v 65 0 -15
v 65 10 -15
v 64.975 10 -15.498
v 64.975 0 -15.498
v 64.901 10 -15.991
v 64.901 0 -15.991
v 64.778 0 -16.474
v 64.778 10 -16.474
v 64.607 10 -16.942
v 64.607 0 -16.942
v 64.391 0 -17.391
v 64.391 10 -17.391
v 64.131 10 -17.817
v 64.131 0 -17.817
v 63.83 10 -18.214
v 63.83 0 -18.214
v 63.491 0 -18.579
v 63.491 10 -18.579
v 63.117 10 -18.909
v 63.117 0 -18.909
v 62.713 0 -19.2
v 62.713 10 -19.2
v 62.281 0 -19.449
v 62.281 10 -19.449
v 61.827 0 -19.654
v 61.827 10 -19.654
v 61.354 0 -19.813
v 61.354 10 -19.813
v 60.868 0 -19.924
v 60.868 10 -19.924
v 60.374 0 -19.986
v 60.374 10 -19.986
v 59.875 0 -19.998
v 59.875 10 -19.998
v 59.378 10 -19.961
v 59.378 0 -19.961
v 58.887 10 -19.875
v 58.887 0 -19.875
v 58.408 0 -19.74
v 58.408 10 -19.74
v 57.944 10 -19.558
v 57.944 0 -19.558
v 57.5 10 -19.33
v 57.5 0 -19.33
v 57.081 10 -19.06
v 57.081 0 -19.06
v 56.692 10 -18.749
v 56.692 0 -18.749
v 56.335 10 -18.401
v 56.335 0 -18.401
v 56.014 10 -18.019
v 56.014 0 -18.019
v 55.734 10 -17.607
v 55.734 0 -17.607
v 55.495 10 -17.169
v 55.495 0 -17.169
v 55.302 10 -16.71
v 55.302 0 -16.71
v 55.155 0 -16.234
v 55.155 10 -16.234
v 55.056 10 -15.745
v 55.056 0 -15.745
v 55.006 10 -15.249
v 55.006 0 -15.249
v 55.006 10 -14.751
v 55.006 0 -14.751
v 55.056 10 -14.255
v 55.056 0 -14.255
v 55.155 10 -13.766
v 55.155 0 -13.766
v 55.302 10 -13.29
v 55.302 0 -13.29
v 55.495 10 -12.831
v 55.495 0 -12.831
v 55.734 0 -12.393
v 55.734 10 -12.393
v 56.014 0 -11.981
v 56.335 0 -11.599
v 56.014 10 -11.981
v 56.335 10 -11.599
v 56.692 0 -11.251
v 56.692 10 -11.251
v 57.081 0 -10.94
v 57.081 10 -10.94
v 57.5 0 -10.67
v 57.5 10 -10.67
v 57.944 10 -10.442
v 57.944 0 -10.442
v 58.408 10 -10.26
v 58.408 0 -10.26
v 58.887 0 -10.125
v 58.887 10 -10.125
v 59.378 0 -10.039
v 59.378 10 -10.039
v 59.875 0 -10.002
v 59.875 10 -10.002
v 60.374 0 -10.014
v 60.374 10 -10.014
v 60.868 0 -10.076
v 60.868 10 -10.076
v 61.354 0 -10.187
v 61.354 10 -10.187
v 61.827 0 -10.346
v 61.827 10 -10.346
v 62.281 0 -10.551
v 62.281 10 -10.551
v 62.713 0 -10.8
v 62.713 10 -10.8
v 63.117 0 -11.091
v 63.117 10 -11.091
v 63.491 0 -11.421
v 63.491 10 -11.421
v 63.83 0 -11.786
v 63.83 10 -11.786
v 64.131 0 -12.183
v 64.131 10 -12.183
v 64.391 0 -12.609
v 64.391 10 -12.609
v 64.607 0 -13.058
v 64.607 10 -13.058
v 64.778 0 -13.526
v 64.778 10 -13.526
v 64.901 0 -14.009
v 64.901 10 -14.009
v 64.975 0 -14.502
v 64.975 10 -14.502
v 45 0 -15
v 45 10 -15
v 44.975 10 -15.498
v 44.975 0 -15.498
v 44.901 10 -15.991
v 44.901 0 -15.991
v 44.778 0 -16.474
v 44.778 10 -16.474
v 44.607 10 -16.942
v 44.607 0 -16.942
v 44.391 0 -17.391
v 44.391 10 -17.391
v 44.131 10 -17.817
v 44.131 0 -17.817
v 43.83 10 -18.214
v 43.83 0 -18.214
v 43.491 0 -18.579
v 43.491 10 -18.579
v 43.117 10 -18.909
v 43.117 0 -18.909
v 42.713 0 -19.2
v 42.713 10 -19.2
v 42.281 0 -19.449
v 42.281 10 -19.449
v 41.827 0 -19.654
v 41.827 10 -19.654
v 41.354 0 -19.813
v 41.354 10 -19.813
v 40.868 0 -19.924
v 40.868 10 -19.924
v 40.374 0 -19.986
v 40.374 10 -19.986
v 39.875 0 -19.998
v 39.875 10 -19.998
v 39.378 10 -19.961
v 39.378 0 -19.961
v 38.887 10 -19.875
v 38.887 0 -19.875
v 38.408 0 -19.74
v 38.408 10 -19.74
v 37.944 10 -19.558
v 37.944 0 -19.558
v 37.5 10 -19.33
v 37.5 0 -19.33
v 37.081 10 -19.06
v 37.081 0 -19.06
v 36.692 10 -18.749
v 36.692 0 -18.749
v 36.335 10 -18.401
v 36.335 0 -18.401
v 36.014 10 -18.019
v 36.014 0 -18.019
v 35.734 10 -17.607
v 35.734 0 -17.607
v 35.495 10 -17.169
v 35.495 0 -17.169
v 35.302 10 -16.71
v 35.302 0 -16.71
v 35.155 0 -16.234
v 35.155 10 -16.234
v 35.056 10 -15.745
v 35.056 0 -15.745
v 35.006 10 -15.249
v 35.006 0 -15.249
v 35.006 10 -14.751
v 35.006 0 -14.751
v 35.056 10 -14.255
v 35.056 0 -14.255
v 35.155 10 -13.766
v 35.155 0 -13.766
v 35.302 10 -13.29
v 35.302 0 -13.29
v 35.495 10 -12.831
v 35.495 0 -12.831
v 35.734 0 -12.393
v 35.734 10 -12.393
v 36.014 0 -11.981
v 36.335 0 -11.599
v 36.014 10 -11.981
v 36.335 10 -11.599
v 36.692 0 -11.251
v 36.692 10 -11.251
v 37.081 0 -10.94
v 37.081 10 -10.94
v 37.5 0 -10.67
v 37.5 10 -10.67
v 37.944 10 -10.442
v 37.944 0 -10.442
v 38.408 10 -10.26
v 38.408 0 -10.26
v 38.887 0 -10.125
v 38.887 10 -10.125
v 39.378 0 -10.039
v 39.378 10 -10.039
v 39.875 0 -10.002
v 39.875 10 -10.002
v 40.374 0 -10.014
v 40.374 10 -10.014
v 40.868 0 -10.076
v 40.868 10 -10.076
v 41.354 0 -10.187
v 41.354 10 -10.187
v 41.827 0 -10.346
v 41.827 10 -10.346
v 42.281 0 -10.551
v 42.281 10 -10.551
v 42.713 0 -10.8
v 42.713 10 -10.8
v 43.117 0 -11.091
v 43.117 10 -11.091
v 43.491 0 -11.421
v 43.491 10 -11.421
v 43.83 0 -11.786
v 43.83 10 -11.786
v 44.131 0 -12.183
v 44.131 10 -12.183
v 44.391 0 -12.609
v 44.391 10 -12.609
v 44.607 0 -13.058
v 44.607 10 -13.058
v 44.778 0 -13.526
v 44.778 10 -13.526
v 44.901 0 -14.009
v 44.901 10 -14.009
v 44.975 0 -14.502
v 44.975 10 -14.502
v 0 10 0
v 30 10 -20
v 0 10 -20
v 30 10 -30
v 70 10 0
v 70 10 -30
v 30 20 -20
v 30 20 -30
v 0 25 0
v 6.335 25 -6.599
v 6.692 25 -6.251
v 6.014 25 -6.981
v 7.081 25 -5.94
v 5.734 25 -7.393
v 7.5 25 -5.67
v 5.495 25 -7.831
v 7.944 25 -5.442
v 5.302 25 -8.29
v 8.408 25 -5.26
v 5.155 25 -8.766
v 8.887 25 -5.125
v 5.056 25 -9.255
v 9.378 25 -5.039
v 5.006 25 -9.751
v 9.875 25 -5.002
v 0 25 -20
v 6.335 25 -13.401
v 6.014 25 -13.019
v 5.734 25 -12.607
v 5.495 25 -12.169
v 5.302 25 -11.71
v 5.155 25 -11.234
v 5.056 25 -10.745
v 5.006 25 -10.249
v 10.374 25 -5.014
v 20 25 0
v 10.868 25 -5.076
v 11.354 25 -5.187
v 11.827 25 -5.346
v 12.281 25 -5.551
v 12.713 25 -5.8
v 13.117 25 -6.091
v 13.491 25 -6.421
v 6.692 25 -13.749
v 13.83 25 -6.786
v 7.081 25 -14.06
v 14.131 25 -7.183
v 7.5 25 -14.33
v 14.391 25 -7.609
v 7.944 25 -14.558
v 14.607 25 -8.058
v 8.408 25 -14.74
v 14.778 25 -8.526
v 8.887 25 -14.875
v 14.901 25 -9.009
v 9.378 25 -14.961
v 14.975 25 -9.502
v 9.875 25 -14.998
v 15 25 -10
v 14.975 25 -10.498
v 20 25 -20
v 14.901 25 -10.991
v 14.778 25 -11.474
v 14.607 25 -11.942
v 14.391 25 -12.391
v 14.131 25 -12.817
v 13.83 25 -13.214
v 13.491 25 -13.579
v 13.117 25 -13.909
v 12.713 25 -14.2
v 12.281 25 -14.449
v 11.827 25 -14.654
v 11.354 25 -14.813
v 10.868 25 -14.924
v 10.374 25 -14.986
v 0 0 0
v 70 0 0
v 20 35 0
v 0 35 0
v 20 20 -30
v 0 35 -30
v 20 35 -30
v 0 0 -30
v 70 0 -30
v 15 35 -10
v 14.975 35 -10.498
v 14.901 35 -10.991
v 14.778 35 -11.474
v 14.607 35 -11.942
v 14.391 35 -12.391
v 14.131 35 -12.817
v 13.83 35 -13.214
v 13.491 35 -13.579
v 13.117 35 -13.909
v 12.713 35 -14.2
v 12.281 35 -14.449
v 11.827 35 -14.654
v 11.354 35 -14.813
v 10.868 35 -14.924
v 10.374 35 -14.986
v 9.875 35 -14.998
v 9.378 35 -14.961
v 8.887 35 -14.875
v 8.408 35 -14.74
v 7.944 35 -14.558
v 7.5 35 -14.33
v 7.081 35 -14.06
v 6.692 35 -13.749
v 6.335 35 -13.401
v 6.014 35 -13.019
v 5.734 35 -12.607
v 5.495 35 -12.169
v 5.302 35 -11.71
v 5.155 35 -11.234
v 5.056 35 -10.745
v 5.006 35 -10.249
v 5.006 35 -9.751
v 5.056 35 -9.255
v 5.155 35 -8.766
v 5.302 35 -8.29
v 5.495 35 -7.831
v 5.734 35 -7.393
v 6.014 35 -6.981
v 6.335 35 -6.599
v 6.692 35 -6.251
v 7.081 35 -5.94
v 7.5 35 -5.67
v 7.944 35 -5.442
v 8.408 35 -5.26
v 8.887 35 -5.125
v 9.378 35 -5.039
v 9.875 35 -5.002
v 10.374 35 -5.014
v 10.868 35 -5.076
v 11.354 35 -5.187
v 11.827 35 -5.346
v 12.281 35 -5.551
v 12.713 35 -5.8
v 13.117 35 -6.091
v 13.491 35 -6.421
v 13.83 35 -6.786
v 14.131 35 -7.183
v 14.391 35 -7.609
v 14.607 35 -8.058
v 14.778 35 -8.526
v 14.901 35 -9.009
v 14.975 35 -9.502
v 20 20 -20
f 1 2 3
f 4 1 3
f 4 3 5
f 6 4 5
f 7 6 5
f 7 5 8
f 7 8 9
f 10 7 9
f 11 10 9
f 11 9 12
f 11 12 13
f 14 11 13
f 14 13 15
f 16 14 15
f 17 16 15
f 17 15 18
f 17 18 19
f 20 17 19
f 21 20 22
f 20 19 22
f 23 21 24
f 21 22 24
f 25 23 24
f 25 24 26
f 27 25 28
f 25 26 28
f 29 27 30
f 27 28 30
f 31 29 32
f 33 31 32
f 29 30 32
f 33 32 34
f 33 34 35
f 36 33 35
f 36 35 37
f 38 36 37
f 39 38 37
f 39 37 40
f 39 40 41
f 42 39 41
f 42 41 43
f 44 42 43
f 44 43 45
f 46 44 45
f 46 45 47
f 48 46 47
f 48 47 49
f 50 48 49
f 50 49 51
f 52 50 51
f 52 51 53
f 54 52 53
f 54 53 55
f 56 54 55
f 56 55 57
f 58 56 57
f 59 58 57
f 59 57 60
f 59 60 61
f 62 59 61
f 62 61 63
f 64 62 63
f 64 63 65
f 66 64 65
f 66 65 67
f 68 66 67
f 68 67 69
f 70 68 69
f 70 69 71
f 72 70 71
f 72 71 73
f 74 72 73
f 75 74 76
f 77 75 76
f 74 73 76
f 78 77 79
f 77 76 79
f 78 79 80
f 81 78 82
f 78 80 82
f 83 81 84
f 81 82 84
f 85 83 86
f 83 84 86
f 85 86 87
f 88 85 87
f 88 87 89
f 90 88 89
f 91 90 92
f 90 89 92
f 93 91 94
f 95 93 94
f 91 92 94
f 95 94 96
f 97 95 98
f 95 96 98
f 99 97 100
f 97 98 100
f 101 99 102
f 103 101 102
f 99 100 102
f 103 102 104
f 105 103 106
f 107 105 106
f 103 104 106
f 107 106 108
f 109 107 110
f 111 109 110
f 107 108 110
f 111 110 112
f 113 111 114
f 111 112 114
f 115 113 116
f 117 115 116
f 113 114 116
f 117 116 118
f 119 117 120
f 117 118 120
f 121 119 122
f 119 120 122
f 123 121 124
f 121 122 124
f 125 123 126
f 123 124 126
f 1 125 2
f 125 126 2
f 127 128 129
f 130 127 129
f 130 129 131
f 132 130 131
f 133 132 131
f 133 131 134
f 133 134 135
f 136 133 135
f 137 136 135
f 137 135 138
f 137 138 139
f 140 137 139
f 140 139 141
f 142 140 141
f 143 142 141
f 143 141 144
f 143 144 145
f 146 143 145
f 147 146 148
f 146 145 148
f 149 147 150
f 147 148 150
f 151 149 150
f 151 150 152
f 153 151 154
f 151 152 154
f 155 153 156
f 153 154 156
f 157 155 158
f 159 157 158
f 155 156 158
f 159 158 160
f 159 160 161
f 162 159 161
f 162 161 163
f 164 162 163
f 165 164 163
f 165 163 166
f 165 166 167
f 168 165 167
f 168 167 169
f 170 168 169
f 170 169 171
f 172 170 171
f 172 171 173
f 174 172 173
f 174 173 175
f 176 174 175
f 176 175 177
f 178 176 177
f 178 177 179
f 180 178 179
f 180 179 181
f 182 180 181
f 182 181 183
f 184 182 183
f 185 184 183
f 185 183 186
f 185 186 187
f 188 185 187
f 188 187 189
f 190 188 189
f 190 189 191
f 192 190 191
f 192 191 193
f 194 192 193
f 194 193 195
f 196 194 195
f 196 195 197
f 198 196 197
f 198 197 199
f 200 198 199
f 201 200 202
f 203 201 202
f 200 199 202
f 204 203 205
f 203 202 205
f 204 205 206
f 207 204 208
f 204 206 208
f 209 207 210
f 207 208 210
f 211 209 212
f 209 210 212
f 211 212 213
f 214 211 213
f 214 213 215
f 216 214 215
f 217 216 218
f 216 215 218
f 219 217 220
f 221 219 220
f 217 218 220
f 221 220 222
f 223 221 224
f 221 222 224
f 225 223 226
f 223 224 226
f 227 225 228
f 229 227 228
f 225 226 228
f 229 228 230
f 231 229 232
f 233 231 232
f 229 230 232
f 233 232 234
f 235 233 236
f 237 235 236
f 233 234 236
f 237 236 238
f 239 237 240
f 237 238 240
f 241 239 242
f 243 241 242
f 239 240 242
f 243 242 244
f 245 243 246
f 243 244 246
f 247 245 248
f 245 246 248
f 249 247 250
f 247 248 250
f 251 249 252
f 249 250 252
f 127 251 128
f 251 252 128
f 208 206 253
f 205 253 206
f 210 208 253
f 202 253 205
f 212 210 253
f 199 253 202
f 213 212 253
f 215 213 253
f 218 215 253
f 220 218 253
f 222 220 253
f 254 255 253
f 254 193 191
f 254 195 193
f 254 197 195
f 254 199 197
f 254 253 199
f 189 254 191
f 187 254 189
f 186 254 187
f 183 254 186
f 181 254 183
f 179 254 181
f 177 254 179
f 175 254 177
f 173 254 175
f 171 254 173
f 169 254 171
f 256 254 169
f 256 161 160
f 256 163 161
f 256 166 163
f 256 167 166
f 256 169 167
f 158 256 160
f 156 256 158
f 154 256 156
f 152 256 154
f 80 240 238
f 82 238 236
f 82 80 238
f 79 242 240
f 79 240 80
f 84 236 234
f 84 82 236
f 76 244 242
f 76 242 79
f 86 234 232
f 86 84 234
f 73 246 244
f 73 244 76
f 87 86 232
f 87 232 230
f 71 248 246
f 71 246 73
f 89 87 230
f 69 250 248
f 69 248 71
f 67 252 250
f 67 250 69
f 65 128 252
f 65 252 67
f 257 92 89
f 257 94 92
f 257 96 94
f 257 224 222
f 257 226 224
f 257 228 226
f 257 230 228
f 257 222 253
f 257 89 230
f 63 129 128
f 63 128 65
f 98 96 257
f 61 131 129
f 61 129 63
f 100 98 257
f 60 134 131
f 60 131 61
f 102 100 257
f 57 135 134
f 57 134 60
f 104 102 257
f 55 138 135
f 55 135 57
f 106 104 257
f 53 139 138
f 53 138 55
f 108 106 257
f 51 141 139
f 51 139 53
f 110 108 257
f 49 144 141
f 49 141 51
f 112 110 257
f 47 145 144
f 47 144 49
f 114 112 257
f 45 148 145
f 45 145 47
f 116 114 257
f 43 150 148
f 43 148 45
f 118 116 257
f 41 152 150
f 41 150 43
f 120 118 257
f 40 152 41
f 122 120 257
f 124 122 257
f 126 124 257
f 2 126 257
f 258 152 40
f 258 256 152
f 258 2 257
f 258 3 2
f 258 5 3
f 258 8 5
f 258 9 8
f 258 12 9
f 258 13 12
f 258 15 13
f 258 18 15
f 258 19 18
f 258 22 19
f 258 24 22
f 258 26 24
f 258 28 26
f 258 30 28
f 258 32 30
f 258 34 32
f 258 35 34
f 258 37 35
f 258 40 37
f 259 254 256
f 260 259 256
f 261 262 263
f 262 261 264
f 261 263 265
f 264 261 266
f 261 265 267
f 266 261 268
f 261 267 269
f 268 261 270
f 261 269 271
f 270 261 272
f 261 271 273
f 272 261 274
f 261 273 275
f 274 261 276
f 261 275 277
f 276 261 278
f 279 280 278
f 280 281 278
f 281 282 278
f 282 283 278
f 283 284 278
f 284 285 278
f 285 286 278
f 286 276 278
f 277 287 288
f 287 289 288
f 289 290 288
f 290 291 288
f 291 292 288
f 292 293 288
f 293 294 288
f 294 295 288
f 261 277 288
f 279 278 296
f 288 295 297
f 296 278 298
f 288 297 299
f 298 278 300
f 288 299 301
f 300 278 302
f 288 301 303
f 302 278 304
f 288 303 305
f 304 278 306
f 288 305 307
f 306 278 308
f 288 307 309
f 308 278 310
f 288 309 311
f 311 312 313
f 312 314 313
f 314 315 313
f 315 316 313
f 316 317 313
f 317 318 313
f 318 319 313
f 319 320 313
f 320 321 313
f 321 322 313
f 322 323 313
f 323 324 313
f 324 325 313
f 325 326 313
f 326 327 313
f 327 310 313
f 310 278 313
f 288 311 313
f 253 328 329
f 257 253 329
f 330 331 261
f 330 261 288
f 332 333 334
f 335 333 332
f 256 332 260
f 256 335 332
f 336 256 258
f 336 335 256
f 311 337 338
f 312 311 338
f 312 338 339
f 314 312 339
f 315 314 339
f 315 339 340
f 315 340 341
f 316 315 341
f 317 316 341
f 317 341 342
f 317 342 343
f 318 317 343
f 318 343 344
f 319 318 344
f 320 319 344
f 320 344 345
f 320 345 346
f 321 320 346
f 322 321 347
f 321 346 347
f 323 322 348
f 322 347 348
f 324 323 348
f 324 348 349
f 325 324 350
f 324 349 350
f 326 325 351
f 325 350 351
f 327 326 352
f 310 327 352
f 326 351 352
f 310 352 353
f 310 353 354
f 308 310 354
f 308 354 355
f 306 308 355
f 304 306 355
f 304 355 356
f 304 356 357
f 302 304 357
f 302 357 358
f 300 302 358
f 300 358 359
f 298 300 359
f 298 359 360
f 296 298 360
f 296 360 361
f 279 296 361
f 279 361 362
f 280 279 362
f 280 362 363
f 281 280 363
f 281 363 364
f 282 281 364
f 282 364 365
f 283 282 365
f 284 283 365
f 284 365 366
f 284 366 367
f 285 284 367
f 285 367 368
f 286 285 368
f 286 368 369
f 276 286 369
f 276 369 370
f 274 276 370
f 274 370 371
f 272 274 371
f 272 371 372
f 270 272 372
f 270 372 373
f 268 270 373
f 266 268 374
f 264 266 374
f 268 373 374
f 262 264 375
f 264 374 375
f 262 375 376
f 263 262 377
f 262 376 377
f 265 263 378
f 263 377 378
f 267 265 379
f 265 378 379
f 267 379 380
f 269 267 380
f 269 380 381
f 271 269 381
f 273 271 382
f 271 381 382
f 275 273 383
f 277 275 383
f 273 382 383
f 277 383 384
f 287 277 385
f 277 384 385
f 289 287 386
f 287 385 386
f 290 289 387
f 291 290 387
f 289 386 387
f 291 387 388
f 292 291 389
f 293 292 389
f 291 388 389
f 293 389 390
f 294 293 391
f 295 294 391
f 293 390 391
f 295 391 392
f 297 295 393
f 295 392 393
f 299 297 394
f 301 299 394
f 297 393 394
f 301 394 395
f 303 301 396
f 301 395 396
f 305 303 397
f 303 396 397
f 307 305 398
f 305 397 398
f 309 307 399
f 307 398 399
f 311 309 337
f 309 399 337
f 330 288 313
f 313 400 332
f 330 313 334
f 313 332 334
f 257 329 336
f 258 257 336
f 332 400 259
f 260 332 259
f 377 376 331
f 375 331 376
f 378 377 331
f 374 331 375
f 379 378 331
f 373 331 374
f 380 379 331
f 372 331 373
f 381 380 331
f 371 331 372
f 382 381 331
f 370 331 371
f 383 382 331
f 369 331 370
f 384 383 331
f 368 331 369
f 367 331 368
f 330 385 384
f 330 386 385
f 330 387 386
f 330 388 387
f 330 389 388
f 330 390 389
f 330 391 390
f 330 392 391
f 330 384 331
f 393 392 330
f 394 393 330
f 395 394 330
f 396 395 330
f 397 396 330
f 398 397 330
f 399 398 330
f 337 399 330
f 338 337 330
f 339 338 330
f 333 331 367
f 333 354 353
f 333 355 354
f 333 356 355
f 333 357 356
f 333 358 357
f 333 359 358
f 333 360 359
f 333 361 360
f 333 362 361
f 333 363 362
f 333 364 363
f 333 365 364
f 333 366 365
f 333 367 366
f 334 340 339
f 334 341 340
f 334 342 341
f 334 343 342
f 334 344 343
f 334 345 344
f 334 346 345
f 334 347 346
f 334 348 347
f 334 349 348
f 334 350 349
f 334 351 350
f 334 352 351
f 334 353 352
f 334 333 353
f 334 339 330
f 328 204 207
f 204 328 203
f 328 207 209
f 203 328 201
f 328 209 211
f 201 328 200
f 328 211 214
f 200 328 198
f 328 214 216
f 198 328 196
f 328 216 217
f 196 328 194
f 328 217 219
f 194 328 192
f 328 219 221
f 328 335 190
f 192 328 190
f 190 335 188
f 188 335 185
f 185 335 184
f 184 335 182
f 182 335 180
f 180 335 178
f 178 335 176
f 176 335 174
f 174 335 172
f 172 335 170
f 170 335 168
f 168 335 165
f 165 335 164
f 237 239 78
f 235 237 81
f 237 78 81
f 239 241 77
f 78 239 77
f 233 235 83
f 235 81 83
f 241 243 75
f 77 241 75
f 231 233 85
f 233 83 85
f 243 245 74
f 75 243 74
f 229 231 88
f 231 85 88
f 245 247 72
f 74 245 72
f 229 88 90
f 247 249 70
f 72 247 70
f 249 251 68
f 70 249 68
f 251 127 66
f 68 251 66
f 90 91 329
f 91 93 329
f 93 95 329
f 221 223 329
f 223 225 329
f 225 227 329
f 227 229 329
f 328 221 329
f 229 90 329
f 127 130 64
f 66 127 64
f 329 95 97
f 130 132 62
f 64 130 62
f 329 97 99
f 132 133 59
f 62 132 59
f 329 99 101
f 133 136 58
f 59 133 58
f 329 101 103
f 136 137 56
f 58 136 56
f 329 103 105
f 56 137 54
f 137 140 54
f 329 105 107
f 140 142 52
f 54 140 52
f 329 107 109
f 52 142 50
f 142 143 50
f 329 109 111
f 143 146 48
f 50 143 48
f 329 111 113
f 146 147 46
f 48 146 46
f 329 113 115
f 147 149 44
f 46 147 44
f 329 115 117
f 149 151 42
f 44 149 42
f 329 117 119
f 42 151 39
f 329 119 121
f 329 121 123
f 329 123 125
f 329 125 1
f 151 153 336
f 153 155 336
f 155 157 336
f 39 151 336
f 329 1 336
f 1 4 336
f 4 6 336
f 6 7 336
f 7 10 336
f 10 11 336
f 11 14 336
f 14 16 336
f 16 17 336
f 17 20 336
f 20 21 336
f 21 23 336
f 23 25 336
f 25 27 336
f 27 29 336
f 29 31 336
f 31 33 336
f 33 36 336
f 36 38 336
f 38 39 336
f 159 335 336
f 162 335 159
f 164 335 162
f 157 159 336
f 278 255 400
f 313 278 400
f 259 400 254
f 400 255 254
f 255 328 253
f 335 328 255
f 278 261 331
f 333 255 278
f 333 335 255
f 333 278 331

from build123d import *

# Parameters (mm, degrees)
SKETCH1_W           = 70
SKETCH1_H           = 30
BOSS_EXTRUDE2_DEPTH = 10
SKETCH3_W           = 30
SKETCH3_H           = 10
BOSS_EXTRUDE3_DEPTH = 25
SKETCH4_W           = 10
SKETCH4_H           = 15
CUT_EXTRUDE1_DEPTH  = 11
SKETCH5_W           = 20
SKETCH5_H           = 10
BOSS_EXTRUDE4_DEPTH = 20
SKETCH6_R           = 5
CUT_EXTRUDE2_DEPTH  = 11
SKETCH7_R           = 5
CUT_EXTRUDE3_DEPTH  = 15


with BuildPart() as part:
    # Sketch1 → Boss-Extrude2 (new body)
    with BuildSketch(Plane(origin=(0, 0, 0), x_dir=(1, 0, 0), z_dir=(0, 1, 0))):
        with Locations((35, 15)):
            Rectangle(SKETCH1_W, SKETCH1_H)
    extrude(amount=BOSS_EXTRUDE2_DEPTH)

    # Sketch3 → Boss-Extrude3 (add)
    with BuildSketch(Plane(origin=(0, 10, 0), x_dir=(1, 0, 0), z_dir=(0, 1, 0))):
        with Locations((15, 25)):
            Rectangle(SKETCH3_W, SKETCH3_H)
    extrude(amount=BOSS_EXTRUDE3_DEPTH)

    # Sketch4 → Cut-Extrude1 (cut, through all)
    with BuildSketch(Plane.XY.offset(-20)):
        with Locations((25, 27.5)):
            Rectangle(SKETCH4_W, SKETCH4_H)
    extrude(amount=-CUT_EXTRUDE1_DEPTH, mode=Mode.SUBTRACT)

    # Sketch5 → Boss-Extrude4 (add)
    with BuildSketch(Plane.XY.offset(-20)):
        with Locations((10, 30)):
            Rectangle(SKETCH5_W, SKETCH5_H)
    extrude(amount=BOSS_EXTRUDE4_DEPTH)

    # Sketch6 → Cut-Extrude2 (cut, through all)
    with BuildSketch(Plane(origin=(0, 10, 0), x_dir=(1, 0, 0), z_dir=(0, 1, 0))):
        with Locations((40, 15)):
            Circle(SKETCH6_R)
        with Locations((60, 15)):
            Circle(SKETCH6_R)
    extrude(amount=-CUT_EXTRUDE2_DEPTH, mode=Mode.SUBTRACT)

    # Sketch7 → Cut-Extrude3 (cut)
    with BuildSketch(Plane(origin=(0, 35, 0), x_dir=(1, 0, 0), z_dir=(0, 1, 0))):
        with Locations((10, 10)):
            Circle(SKETCH7_R)
    extrude(amount=-CUT_EXTRUDE3_DEPTH, mode=Mode.SUBTRACT)


solid = part.part
